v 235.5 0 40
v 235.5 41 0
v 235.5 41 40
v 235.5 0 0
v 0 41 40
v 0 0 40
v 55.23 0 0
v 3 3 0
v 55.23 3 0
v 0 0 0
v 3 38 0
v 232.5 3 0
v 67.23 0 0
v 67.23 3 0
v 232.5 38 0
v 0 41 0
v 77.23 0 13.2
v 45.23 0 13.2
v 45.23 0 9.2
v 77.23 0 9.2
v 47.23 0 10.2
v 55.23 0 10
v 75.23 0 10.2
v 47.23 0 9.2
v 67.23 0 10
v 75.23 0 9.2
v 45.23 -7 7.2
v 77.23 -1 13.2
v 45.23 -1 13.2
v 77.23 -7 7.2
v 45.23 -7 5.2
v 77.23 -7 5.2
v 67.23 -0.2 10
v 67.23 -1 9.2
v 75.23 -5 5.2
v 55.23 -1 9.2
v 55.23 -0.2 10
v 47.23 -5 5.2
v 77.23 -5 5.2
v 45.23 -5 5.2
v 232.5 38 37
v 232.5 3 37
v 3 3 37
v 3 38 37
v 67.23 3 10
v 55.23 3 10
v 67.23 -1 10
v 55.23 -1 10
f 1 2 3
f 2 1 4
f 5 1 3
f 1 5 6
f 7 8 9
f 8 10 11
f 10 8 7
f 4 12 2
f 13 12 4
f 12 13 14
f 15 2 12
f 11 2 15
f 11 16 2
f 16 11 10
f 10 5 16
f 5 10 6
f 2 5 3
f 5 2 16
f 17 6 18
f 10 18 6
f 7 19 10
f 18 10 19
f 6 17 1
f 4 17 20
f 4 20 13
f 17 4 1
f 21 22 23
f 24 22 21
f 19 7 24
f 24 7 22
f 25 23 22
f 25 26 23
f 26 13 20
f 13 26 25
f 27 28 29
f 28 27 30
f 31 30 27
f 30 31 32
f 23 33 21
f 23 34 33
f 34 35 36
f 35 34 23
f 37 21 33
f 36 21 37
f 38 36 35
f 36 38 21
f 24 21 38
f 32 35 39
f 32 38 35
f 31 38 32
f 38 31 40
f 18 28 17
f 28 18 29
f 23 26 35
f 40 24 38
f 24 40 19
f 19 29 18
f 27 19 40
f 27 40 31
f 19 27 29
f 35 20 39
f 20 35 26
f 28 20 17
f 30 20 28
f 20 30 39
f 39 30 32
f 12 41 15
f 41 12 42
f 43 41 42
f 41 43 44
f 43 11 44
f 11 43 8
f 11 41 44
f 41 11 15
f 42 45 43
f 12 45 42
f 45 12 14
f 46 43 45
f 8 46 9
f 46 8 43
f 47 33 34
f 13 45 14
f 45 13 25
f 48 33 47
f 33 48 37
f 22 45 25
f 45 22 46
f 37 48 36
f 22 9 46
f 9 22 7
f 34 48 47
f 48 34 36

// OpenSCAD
// OpenSCAD 2021.01 compatible
// Protective cover / housing for the pump holder
//
// Features:
// - exact OUTER dimensions: 229.5 x 35 x 40 mm
// - open on the bottom
// - cable slit in the front long side wall
// - slit is open down to z = 0
// - sloped rain roof above the slit
// - additional side cheeks on left and right for outdoor rain protection

$fn = 64;

// -----------------------------
// User parameters
// -----------------------------
outer_width  = 235.5;   // X 228.5 is the plate
outer_depth  = 41.0;    // Y 34 is the plate
outer_height = 40.0;    // Z

wall_thickness = 3;   // side wall thickness
top_thickness  = 3;   // top wall thickness

// Cable slit
cable_slot_x      = outer_width * 0.26;  // center position along width
cable_slot_width  = 12.0;                // opening width in X
cable_slot_top_z  = 10.0;                // opening top height; bottom is fixed at z = 0

// Rain roof
roof_clearance    = 1.2;   // gap from slot top to roof underside
roof_projection   = 6.0;   // how far the roof sticks out
roof_drop         = 6.0;   // how much the outer edge drops for runoff
roof_thickness    = 2.0;   // roof material thickness
roof_side_margin  = 8.0;   // extra width beyond slot on each side

// Side cheeks
side_cheek_thickness = 2.0; // thickness of the side rain cheeks

// -----------------------------
// Helpers
// -----------------------------
roof_x0 = cable_slot_x - cable_slot_width / 2 - roof_side_margin;
roof_x1 = cable_slot_x + cable_slot_width / 2 + roof_side_margin;
roof_width = roof_x1 - roof_x0;

roof_back_z = cable_slot_top_z + roof_clearance;
roof_front_z = roof_back_z - roof_drop;

module outer_shell() {
    cube([outer_width, outer_depth, outer_height]);
}

module inner_cavity() {
    translate([wall_thickness, wall_thickness, 0])
        cube([
            outer_width - 2 * wall_thickness,
            outer_depth - 2 * wall_thickness,
            outer_height - top_thickness
        ]);
}

module cable_slot_cutout_front() {
    translate([
        cable_slot_x - cable_slot_width / 2,
        -1,
        0
    ])
        cube([
            cable_slot_width,
            wall_thickness + 2,
            cable_slot_top_z
        ]);
}

// Main sloped rain roof above the slit
module rain_roof_front() {
    hull() {
        // rear strip, close to wall
        translate([roof_x0, -roof_thickness / 2, roof_back_z])
            cube([roof_width, roof_thickness, roof_thickness]);

        // front strip, lower for runoff
        translate([roof_x0, -roof_projection - roof_thickness / 2, roof_front_z])
            cube([roof_width, roof_thickness, roof_thickness]);
    }
}

// Left side cheek
module rain_cheek_left() {
    hull() {
        // rear vertical strip near wall
        translate([roof_x0 - side_cheek_thickness, -roof_thickness / 2, cable_slot_top_z])
            cube([side_cheek_thickness, roof_thickness, roof_back_z + roof_thickness - cable_slot_top_z]);

        // front upper strip at roof tip
        translate([roof_x0 - side_cheek_thickness, -roof_projection - roof_thickness / 2, roof_front_z])
            cube([side_cheek_thickness, roof_thickness, roof_thickness]);
    }
}

// Right side cheek
module rain_cheek_right() {
    hull() {
        // rear vertical strip near wall
        translate([roof_x1, -roof_thickness / 2, cable_slot_top_z])
            cube([side_cheek_thickness, roof_thickness, roof_back_z + roof_thickness - cable_slot_top_z]);

        // front upper strip at roof tip
        translate([roof_x1, -roof_projection - roof_thickness / 2, roof_front_z])
            cube([side_cheek_thickness, roof_thickness, roof_thickness]);
    }
}

module protective_cover() {
    difference() {
        union() {
            outer_shell();
            rain_roof_front();
            rain_cheek_left();
            rain_cheek_right();
        }

        // Bottom-open cavity
        inner_cavity();

        // Cable slit
        cable_slot_cutout_front();
    }
}

protective_cover();
